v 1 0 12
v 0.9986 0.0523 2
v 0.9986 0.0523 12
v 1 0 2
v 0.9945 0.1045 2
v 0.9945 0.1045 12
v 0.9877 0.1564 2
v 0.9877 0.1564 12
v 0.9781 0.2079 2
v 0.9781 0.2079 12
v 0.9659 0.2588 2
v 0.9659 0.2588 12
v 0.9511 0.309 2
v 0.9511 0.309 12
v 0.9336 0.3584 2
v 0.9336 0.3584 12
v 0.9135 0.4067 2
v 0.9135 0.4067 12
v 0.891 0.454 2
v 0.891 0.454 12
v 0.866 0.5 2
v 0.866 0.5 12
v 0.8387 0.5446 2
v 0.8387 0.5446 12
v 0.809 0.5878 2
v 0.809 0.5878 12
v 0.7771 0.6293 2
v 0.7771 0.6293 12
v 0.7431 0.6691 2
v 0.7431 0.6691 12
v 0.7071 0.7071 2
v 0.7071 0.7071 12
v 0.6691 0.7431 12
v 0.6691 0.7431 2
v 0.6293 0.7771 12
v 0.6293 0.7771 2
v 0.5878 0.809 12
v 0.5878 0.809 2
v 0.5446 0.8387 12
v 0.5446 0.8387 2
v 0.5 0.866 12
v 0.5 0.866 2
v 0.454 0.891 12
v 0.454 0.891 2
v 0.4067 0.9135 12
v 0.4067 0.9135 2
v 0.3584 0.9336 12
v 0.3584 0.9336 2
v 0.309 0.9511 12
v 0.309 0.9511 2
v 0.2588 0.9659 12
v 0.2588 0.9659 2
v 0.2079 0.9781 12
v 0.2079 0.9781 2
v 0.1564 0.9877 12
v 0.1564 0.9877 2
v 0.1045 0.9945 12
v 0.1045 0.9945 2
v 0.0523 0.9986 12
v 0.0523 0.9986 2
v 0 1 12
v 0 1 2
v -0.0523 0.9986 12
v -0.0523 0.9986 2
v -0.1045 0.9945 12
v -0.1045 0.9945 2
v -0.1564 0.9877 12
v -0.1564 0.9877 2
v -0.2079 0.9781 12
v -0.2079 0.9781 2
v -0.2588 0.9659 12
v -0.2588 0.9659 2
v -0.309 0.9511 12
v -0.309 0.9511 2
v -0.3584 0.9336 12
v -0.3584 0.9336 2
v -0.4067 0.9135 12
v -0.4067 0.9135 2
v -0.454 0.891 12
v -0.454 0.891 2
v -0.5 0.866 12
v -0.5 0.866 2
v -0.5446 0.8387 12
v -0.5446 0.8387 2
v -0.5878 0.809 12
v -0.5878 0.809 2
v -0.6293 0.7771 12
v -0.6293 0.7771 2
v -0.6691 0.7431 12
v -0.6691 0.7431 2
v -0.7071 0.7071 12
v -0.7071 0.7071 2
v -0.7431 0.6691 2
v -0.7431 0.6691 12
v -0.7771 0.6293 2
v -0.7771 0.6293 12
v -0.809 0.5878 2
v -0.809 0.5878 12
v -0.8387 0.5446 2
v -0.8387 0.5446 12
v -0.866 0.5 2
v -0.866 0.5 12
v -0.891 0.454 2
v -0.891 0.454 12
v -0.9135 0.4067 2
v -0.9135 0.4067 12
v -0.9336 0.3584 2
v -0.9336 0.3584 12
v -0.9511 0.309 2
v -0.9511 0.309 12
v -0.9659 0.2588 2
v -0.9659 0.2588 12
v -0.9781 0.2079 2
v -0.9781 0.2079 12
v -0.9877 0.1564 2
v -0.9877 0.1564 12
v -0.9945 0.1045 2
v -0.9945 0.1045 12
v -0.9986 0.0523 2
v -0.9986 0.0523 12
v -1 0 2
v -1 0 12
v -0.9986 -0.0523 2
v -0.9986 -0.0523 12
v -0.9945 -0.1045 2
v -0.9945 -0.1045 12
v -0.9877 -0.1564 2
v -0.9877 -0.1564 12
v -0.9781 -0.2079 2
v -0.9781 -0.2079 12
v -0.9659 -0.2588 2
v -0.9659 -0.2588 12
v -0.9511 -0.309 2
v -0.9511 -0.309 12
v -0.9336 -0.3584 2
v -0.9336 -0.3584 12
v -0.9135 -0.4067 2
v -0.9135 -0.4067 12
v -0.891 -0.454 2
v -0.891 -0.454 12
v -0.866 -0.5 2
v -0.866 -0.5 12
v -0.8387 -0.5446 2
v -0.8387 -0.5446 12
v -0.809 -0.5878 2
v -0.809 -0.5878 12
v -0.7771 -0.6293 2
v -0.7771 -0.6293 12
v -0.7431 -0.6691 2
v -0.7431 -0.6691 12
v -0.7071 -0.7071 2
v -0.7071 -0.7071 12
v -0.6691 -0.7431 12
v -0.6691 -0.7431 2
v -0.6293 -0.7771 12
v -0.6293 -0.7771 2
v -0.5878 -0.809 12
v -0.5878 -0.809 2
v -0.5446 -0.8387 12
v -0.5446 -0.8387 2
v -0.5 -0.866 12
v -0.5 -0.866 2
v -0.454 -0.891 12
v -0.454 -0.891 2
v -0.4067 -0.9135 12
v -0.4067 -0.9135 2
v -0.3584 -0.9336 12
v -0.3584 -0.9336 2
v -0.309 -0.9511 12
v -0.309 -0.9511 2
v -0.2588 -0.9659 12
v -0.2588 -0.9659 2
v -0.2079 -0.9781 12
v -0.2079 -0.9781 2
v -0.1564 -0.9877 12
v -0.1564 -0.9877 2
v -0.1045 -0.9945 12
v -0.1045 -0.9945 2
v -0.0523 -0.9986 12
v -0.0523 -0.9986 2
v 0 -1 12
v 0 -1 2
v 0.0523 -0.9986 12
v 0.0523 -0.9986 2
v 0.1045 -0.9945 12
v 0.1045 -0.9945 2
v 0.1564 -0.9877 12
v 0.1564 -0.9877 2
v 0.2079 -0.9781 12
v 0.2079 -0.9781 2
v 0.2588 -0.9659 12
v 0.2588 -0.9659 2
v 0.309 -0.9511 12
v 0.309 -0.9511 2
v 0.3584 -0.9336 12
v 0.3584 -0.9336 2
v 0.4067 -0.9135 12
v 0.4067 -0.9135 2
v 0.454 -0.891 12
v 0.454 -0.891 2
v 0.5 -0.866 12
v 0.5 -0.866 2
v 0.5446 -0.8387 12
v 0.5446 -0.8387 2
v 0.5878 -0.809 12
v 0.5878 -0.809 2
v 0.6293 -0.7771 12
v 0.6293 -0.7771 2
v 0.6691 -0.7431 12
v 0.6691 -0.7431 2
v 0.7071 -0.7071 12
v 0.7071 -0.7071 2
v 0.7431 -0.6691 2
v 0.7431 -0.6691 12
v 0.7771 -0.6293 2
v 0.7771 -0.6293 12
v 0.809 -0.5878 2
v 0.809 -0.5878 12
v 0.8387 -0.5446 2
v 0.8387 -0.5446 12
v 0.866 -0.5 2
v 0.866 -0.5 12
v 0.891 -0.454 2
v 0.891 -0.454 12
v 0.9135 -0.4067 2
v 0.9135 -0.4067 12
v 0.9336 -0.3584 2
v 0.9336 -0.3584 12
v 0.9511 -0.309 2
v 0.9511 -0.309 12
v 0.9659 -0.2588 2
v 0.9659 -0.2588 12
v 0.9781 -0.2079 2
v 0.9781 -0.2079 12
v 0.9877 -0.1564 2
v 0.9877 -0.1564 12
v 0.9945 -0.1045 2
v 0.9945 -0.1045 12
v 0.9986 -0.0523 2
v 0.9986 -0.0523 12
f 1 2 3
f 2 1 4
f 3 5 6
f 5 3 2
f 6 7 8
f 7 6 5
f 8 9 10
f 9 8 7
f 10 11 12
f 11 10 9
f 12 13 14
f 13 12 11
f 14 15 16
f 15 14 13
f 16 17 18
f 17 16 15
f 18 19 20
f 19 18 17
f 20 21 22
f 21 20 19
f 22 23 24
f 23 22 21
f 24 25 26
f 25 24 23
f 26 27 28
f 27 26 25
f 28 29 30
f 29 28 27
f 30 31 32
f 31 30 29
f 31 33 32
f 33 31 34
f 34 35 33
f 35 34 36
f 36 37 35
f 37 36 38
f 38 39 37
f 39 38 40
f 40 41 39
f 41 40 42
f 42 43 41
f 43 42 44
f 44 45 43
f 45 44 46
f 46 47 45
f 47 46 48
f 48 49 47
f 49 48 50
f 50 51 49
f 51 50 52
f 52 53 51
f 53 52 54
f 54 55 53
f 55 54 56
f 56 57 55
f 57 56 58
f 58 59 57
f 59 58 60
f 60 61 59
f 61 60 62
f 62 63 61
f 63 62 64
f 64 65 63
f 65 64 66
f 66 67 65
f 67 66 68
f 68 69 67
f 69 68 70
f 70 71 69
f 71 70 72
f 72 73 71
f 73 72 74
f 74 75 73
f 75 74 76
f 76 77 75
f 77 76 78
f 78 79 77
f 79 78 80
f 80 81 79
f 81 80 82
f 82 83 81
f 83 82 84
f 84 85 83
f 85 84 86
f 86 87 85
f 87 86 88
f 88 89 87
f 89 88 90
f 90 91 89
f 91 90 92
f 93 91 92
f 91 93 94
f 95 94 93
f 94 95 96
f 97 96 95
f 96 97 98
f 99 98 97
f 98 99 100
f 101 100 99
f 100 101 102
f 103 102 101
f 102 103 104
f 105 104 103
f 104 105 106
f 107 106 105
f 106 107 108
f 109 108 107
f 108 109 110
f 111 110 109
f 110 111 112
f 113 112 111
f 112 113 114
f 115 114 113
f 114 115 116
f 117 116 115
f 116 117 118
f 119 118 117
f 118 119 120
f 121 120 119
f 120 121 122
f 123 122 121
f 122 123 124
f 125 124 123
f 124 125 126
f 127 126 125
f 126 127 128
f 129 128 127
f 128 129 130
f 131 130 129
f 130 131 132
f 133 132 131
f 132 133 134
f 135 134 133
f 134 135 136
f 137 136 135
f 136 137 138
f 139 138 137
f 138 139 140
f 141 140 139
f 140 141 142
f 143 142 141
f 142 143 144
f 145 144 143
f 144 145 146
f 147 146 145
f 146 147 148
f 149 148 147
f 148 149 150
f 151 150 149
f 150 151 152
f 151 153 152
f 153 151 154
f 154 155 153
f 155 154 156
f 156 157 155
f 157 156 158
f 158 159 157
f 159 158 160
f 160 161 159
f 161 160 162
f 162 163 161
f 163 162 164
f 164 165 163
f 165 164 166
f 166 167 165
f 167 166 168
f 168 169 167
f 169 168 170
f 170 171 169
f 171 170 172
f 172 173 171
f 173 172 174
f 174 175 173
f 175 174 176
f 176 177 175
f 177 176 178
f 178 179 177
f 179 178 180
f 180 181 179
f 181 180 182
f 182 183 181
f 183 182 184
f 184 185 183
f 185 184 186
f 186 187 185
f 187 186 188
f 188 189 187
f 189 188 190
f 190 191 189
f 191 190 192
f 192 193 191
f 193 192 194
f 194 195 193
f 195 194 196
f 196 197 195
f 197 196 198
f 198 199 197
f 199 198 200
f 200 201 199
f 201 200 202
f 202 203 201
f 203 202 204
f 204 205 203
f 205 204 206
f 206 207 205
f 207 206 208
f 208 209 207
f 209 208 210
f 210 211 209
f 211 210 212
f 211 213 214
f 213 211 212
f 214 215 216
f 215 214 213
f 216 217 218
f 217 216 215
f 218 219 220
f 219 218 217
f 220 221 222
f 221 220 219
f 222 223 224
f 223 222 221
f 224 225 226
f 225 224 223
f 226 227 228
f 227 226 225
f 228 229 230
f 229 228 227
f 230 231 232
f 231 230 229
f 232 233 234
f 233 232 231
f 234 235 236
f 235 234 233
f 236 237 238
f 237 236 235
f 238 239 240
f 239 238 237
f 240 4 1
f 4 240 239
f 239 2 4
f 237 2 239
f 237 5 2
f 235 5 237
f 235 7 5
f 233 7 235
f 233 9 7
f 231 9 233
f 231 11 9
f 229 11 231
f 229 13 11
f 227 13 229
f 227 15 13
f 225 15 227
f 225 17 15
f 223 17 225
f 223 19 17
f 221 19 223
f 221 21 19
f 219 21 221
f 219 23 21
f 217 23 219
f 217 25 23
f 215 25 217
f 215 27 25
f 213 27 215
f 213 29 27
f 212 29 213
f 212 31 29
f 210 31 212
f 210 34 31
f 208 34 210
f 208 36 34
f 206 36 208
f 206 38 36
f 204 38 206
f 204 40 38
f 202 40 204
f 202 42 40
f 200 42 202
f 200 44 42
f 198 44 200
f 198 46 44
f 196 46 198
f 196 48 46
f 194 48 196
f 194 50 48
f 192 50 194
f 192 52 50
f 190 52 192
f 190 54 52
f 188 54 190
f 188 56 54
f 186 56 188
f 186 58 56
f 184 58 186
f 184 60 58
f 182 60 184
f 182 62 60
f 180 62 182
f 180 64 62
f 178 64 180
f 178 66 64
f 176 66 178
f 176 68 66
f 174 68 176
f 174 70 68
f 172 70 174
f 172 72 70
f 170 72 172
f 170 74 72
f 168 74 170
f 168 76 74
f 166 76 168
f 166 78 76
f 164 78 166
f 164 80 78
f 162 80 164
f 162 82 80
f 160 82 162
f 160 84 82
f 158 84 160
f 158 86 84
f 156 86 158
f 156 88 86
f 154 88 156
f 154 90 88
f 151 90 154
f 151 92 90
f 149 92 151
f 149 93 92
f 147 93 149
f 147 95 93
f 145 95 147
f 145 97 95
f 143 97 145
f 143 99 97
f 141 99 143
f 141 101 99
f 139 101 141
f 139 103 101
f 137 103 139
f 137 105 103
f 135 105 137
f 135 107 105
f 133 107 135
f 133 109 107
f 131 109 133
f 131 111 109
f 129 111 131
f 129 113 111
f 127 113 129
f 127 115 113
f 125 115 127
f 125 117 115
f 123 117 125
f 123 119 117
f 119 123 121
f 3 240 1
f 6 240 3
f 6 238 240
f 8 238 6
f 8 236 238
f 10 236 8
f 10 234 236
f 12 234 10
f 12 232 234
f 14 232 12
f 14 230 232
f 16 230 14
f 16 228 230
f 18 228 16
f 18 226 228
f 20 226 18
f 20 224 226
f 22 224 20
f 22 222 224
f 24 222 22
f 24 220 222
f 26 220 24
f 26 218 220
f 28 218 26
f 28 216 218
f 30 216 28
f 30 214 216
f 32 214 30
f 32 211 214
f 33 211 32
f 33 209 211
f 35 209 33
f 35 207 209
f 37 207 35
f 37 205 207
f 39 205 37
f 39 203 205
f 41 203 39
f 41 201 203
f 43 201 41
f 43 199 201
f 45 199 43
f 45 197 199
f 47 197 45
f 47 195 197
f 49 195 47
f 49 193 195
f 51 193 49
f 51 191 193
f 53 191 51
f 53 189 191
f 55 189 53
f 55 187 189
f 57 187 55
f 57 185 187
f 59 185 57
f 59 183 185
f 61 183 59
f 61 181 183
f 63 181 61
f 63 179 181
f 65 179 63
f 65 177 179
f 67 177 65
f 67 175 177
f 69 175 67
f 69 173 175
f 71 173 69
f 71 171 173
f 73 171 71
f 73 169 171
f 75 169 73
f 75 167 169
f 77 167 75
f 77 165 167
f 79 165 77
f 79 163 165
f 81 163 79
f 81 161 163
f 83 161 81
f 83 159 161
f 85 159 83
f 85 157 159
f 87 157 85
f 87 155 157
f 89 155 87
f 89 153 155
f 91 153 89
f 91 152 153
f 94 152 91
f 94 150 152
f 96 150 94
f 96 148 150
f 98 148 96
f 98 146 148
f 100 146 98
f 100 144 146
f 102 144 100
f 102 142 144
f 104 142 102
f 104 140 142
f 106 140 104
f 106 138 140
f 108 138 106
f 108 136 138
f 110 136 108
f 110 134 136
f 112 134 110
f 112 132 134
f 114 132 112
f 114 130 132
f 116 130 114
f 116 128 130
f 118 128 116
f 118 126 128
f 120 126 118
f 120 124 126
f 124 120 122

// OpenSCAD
gThickness = 2;

module enclosure(motor_diam, motor_len, thickness) {
    enclosure_outer_len = motor_len + thickness;
    enclosure_outer_diam = motor_diam;

    enclosure_inner_len = motor_len;
    enclosure_inner_diam = motor_diam;

    difference() {
        %cylinder(h = enclosure_outer_len, d = enclosure_outer_diam);

        #translate([0, 0, thickness])
        cylinder(h = enclosure_inner_len, enclosure_inner_diam);
    }
}

$fn = 120;

enclosure(10, 20, gThickness);
